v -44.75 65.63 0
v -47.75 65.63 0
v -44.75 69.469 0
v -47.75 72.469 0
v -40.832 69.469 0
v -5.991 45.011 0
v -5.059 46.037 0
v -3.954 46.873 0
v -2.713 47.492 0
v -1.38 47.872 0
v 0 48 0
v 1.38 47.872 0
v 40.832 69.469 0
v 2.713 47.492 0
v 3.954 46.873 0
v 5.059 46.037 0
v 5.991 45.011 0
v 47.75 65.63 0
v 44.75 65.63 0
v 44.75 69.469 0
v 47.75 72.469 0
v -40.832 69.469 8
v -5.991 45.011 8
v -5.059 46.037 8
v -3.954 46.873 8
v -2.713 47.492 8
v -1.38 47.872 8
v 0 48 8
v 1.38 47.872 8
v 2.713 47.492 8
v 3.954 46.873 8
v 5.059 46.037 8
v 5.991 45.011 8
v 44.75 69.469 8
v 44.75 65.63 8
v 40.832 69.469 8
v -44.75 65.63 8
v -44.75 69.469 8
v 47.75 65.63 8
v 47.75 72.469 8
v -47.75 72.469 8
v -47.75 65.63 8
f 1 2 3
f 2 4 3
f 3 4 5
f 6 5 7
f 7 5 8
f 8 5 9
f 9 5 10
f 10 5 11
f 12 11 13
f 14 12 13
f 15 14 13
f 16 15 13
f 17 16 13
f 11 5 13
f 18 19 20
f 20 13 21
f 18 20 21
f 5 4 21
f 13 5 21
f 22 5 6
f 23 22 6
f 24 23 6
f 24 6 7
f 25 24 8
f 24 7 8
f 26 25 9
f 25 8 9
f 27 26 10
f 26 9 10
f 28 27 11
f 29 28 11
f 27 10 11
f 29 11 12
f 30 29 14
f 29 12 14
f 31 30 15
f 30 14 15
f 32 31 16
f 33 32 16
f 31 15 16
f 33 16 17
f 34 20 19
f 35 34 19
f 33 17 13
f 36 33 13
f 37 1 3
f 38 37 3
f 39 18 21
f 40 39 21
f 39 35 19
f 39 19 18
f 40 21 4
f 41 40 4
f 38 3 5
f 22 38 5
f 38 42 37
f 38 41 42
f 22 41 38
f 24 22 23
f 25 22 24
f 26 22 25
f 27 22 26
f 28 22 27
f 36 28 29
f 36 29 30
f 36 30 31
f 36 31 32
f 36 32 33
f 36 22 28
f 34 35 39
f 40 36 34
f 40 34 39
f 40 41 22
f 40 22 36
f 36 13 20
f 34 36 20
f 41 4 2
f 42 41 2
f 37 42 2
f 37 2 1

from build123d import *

# Parameters (mm, degrees)
BOSS_EXTRU_1_DEPTH = 8


with BuildPart() as part:
    # Esquisse2 → Boss.-Extru.1 (new body)
    with BuildSketch(Plane.XY):
        with BuildLine():
            Line((-47.75, 65.629607354), (-44.75, 65.629607354))
            Line((-44.75, 65.629607354), (-44.75, 69.468928374))
            Line((-44.75, 69.468928374), (-40.831689929, 69.468928374))
            Line((-40.831689929, 69.468928374), (-5.991442082, 45.011388011))
            ThreePointArc((-5.991442082, 45.011388011), (0, 48), (5.991442082, 45.011388011))
            Line((5.991442082, 45.011388011), (40.831689929, 69.468928374))
            Line((40.831689929, 69.468928374), (44.75, 69.468928374))
            Line((44.75, 69.468928374), (44.75, 65.629607354))
            Line((44.75, 65.629607354), (47.75, 65.629607354))
            Line((47.75, 65.629607354), (47.75, 72.468928374))
            Line((47.75, 72.468928374), (-47.75, 72.468928374))
            Line((-47.75, 72.468928374), (-47.75, 65.629607354))
        make_face()
    extrude(amount=BOSS_EXTRU_1_DEPTH)


solid = part.part
